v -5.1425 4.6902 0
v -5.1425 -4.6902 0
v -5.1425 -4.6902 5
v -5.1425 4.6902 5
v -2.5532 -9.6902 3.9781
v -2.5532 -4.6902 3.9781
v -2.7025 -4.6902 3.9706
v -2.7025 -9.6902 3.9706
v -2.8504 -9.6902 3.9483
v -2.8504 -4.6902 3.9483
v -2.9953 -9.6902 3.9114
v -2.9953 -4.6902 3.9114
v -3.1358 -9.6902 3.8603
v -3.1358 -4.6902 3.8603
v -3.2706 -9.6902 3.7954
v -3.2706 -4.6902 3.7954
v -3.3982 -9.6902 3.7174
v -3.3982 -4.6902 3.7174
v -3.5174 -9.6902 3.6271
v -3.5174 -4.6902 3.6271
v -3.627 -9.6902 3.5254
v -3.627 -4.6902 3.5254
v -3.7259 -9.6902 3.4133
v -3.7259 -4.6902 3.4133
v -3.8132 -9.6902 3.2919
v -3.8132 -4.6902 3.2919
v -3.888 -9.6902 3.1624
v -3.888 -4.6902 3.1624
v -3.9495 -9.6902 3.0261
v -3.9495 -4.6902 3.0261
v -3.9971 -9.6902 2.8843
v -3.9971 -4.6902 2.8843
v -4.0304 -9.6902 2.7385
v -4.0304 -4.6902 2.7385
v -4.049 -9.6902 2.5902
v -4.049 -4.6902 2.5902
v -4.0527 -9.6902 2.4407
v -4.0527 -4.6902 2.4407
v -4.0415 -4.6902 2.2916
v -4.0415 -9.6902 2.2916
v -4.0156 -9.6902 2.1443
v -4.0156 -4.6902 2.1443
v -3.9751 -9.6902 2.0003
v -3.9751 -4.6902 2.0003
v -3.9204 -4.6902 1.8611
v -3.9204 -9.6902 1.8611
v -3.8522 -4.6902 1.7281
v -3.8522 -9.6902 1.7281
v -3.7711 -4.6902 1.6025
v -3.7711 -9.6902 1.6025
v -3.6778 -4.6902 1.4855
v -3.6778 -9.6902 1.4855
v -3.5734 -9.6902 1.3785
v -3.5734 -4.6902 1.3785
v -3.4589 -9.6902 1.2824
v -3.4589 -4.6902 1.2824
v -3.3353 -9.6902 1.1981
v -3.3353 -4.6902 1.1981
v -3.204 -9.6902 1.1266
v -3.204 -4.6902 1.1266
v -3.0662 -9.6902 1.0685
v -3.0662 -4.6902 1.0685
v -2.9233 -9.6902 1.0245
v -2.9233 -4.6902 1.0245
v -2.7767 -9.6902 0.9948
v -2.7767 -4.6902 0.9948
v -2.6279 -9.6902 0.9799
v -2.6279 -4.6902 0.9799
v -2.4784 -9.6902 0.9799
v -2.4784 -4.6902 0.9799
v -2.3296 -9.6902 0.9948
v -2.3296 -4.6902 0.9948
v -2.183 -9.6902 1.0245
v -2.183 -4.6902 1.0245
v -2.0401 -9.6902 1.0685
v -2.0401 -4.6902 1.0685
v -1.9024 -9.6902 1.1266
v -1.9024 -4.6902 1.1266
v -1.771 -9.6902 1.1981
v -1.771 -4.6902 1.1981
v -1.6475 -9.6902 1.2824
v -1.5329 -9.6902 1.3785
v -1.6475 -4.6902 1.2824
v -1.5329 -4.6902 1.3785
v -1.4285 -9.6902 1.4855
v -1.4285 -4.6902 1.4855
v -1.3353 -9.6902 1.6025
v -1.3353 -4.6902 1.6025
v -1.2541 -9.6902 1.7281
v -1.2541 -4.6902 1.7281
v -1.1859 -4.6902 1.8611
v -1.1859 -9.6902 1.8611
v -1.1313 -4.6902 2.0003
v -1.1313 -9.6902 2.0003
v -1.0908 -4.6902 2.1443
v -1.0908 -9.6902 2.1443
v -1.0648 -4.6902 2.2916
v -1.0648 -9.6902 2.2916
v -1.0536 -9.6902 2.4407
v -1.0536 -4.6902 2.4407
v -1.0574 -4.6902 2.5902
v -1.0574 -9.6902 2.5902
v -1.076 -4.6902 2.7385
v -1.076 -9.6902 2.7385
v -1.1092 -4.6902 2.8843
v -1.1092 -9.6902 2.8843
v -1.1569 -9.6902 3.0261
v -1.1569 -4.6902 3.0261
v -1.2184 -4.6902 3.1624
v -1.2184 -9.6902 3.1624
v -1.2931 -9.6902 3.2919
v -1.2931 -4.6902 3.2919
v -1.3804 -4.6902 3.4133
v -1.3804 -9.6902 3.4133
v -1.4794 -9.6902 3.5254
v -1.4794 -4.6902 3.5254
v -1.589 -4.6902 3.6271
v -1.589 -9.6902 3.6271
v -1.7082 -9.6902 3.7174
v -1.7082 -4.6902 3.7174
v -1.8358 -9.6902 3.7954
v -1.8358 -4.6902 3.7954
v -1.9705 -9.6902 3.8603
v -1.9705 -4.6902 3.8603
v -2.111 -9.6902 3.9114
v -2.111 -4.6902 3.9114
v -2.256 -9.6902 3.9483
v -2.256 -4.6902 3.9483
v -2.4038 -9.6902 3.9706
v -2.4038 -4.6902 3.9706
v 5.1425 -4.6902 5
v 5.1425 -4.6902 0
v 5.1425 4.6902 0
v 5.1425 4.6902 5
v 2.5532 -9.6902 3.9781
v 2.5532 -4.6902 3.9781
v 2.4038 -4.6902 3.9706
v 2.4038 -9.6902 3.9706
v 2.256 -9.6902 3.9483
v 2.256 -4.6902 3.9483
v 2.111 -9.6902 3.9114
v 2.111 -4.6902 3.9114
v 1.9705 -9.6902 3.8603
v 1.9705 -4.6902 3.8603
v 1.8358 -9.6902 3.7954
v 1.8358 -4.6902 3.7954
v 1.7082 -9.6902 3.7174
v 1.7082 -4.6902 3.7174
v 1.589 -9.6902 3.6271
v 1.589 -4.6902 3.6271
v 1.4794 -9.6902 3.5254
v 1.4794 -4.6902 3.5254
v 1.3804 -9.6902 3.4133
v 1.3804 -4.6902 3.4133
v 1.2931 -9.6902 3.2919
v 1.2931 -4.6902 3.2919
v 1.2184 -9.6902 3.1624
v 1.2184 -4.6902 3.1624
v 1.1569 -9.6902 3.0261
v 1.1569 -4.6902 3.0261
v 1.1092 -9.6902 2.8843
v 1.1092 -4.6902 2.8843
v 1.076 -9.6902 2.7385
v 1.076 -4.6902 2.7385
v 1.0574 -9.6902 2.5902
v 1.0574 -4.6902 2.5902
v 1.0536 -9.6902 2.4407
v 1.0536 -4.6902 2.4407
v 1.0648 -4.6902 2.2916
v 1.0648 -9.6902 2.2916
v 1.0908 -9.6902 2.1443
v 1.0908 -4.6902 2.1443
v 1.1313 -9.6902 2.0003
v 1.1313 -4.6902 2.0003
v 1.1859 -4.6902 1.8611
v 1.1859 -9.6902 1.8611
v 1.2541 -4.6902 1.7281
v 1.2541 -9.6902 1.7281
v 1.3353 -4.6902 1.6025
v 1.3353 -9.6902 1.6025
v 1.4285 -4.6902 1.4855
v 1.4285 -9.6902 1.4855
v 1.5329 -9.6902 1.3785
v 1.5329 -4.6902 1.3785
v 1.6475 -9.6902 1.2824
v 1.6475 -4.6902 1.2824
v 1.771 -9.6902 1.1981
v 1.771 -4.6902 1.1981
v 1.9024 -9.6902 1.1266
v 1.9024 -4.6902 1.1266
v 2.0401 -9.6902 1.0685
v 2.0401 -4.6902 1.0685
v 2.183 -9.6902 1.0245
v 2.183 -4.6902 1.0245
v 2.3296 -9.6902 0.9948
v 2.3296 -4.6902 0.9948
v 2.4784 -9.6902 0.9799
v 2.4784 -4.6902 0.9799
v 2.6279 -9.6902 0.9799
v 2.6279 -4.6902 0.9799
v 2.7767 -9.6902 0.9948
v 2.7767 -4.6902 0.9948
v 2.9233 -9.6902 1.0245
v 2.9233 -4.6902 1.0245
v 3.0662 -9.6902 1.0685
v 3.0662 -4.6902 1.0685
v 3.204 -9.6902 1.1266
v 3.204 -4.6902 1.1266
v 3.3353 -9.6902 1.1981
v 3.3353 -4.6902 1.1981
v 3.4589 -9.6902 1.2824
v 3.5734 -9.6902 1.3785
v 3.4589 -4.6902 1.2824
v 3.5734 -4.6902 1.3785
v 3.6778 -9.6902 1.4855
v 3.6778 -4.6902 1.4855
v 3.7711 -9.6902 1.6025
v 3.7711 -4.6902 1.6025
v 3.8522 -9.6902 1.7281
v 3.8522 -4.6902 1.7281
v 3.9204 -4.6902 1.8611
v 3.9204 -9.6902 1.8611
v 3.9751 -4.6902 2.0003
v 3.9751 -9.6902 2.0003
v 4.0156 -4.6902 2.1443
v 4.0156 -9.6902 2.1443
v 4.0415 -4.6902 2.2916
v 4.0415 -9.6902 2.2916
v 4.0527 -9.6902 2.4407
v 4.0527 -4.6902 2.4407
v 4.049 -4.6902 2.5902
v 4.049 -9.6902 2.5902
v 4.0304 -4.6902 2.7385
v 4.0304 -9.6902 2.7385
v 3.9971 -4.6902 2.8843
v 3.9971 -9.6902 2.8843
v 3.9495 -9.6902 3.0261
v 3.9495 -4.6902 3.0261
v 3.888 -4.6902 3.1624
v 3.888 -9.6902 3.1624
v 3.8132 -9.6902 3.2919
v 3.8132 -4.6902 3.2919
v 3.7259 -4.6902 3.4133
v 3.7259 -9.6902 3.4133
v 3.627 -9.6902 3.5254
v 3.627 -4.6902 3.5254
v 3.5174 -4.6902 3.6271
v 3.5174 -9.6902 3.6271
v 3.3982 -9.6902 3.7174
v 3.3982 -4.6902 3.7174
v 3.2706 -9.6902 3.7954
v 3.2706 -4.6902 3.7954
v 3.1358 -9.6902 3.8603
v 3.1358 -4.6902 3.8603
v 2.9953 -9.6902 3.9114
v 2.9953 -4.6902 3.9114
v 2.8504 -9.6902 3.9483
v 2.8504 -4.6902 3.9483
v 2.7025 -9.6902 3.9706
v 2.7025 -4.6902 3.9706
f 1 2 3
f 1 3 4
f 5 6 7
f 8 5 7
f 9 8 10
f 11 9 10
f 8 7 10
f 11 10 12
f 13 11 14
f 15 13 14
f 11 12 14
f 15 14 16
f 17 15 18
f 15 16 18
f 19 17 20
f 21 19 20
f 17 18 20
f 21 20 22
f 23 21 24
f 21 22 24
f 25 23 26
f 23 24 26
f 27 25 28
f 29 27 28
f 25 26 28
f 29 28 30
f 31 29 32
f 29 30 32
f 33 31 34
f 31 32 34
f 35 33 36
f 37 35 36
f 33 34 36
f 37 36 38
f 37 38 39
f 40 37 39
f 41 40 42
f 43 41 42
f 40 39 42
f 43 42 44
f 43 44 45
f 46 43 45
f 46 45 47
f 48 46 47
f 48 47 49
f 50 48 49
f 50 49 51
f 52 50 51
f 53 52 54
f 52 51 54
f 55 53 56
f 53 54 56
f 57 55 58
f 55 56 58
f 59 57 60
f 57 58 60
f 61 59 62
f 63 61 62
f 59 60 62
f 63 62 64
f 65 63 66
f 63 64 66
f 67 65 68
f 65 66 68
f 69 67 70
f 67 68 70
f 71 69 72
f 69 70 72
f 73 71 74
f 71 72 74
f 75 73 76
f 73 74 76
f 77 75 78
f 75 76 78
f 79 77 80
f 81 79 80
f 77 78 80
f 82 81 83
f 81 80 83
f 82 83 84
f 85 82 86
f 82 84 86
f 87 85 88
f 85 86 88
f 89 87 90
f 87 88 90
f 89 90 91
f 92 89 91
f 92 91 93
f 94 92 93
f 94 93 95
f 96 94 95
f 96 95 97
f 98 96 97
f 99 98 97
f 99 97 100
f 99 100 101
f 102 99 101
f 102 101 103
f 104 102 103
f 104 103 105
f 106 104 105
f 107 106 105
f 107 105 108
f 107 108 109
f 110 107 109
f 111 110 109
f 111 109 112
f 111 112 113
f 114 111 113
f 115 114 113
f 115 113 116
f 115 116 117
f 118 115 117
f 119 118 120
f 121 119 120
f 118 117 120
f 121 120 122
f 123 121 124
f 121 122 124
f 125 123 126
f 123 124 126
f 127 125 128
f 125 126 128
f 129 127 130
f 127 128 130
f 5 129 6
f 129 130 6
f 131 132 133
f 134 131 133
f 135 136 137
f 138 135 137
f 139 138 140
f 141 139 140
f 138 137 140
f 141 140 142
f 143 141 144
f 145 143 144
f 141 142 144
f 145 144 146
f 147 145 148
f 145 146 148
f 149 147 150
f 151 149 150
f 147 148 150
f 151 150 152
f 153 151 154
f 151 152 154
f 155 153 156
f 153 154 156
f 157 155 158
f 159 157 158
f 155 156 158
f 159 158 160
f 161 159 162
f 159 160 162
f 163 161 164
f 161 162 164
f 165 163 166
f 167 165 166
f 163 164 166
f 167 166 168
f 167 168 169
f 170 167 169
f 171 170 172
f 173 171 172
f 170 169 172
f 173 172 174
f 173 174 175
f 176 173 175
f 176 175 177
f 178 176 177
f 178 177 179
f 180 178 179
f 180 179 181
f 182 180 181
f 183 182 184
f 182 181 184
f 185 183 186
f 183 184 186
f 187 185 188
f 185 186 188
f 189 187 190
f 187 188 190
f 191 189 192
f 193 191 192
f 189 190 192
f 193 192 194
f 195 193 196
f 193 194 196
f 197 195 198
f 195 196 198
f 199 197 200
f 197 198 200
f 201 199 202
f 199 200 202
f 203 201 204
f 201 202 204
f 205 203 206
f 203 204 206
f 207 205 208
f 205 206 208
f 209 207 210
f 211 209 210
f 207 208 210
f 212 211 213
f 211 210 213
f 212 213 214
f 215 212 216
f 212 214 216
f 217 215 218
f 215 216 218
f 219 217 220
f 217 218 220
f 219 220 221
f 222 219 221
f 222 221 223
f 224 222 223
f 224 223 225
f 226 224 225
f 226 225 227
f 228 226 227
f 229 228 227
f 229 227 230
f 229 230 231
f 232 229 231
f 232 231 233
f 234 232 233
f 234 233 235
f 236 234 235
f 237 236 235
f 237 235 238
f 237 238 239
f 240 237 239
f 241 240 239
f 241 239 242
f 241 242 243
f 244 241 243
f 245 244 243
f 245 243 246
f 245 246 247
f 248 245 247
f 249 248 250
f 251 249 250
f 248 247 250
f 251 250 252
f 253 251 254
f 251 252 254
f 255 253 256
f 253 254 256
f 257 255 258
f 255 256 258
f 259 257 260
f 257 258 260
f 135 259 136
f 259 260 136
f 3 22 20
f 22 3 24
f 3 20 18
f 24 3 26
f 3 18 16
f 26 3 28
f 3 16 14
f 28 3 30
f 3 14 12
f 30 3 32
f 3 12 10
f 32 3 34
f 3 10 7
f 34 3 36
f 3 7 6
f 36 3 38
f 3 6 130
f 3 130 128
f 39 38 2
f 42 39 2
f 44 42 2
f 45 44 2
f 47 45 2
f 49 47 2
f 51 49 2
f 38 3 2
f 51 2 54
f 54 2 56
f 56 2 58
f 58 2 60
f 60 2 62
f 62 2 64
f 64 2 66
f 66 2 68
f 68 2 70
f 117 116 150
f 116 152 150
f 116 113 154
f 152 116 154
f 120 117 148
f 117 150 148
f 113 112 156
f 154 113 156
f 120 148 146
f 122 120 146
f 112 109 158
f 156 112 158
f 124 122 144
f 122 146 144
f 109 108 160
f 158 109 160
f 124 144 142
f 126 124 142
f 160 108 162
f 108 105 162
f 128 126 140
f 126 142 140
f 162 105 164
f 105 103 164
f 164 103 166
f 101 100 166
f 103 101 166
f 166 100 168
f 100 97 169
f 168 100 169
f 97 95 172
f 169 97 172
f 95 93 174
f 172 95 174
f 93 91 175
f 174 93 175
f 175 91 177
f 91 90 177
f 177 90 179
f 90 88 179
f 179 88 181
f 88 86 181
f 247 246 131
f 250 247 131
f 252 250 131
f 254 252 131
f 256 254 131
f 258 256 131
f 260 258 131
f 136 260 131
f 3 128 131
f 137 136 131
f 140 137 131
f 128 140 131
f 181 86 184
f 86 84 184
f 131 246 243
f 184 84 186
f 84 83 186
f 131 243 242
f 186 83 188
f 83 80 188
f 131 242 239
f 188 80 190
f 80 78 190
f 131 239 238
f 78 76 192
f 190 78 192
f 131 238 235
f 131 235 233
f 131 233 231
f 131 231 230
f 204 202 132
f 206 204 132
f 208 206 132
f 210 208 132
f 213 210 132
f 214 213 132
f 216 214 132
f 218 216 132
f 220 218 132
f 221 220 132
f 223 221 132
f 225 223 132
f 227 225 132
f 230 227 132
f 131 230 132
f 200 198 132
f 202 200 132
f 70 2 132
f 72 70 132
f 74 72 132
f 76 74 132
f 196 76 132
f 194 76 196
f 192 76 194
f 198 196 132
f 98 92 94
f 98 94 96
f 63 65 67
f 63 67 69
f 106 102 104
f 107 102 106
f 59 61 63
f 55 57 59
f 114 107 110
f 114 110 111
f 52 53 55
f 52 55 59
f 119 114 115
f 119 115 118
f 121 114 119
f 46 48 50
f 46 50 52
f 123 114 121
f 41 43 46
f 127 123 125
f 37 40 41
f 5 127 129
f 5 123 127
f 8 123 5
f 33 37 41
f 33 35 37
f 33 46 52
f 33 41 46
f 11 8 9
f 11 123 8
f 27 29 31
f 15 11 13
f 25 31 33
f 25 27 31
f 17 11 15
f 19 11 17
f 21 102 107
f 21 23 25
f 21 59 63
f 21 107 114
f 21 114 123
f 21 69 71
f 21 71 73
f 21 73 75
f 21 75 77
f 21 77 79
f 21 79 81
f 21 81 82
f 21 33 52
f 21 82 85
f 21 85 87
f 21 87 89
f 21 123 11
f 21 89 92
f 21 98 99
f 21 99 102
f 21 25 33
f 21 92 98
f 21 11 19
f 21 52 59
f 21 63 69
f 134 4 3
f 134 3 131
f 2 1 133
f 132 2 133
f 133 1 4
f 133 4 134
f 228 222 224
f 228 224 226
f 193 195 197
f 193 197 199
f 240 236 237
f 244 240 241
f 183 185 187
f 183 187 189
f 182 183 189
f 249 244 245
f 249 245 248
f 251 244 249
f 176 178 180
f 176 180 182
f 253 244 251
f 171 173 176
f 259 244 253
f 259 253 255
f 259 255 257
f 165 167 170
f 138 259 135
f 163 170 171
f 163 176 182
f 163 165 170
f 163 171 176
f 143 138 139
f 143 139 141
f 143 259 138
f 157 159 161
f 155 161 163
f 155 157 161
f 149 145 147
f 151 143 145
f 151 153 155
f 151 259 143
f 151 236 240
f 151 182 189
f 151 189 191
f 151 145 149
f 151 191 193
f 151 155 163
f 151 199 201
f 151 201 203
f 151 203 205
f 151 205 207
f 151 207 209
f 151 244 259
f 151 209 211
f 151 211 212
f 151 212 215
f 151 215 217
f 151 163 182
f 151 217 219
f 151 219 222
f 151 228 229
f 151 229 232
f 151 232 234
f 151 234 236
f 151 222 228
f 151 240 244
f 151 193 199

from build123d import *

# Parameters (mm, degrees)
SKETCH_1_W      = 10.284966626
SKETCH_1_H      = 9.380426844
EXTRUDE_1_DEPTH = 5
SKETCH_2_R      = 1.5
EXTRUDE_2_DEPTH = 5


with BuildPart() as part:
    # 草图1 → 凸台-拉伸1 (new body)
    with BuildSketch(Plane.XY):
        Rectangle(SKETCH_1_W, SKETCH_1_H)
    extrude(amount=EXTRUDE_1_DEPTH)

    # 草图2 → 凸台-拉伸2 (add)
    with BuildSketch(Plane.XZ.offset(4.690213422)):
        with Locations(Location((2.553176364, 2.478071855, 0), (0, 0, 90))):
            Circle(SKETCH_2_R)
        with Locations(Location((-2.553176364, 2.478071855, 0), (0, 0, 90))):
            Circle(SKETCH_2_R)
    extrude(amount=EXTRUDE_2_DEPTH)


solid = part.part
